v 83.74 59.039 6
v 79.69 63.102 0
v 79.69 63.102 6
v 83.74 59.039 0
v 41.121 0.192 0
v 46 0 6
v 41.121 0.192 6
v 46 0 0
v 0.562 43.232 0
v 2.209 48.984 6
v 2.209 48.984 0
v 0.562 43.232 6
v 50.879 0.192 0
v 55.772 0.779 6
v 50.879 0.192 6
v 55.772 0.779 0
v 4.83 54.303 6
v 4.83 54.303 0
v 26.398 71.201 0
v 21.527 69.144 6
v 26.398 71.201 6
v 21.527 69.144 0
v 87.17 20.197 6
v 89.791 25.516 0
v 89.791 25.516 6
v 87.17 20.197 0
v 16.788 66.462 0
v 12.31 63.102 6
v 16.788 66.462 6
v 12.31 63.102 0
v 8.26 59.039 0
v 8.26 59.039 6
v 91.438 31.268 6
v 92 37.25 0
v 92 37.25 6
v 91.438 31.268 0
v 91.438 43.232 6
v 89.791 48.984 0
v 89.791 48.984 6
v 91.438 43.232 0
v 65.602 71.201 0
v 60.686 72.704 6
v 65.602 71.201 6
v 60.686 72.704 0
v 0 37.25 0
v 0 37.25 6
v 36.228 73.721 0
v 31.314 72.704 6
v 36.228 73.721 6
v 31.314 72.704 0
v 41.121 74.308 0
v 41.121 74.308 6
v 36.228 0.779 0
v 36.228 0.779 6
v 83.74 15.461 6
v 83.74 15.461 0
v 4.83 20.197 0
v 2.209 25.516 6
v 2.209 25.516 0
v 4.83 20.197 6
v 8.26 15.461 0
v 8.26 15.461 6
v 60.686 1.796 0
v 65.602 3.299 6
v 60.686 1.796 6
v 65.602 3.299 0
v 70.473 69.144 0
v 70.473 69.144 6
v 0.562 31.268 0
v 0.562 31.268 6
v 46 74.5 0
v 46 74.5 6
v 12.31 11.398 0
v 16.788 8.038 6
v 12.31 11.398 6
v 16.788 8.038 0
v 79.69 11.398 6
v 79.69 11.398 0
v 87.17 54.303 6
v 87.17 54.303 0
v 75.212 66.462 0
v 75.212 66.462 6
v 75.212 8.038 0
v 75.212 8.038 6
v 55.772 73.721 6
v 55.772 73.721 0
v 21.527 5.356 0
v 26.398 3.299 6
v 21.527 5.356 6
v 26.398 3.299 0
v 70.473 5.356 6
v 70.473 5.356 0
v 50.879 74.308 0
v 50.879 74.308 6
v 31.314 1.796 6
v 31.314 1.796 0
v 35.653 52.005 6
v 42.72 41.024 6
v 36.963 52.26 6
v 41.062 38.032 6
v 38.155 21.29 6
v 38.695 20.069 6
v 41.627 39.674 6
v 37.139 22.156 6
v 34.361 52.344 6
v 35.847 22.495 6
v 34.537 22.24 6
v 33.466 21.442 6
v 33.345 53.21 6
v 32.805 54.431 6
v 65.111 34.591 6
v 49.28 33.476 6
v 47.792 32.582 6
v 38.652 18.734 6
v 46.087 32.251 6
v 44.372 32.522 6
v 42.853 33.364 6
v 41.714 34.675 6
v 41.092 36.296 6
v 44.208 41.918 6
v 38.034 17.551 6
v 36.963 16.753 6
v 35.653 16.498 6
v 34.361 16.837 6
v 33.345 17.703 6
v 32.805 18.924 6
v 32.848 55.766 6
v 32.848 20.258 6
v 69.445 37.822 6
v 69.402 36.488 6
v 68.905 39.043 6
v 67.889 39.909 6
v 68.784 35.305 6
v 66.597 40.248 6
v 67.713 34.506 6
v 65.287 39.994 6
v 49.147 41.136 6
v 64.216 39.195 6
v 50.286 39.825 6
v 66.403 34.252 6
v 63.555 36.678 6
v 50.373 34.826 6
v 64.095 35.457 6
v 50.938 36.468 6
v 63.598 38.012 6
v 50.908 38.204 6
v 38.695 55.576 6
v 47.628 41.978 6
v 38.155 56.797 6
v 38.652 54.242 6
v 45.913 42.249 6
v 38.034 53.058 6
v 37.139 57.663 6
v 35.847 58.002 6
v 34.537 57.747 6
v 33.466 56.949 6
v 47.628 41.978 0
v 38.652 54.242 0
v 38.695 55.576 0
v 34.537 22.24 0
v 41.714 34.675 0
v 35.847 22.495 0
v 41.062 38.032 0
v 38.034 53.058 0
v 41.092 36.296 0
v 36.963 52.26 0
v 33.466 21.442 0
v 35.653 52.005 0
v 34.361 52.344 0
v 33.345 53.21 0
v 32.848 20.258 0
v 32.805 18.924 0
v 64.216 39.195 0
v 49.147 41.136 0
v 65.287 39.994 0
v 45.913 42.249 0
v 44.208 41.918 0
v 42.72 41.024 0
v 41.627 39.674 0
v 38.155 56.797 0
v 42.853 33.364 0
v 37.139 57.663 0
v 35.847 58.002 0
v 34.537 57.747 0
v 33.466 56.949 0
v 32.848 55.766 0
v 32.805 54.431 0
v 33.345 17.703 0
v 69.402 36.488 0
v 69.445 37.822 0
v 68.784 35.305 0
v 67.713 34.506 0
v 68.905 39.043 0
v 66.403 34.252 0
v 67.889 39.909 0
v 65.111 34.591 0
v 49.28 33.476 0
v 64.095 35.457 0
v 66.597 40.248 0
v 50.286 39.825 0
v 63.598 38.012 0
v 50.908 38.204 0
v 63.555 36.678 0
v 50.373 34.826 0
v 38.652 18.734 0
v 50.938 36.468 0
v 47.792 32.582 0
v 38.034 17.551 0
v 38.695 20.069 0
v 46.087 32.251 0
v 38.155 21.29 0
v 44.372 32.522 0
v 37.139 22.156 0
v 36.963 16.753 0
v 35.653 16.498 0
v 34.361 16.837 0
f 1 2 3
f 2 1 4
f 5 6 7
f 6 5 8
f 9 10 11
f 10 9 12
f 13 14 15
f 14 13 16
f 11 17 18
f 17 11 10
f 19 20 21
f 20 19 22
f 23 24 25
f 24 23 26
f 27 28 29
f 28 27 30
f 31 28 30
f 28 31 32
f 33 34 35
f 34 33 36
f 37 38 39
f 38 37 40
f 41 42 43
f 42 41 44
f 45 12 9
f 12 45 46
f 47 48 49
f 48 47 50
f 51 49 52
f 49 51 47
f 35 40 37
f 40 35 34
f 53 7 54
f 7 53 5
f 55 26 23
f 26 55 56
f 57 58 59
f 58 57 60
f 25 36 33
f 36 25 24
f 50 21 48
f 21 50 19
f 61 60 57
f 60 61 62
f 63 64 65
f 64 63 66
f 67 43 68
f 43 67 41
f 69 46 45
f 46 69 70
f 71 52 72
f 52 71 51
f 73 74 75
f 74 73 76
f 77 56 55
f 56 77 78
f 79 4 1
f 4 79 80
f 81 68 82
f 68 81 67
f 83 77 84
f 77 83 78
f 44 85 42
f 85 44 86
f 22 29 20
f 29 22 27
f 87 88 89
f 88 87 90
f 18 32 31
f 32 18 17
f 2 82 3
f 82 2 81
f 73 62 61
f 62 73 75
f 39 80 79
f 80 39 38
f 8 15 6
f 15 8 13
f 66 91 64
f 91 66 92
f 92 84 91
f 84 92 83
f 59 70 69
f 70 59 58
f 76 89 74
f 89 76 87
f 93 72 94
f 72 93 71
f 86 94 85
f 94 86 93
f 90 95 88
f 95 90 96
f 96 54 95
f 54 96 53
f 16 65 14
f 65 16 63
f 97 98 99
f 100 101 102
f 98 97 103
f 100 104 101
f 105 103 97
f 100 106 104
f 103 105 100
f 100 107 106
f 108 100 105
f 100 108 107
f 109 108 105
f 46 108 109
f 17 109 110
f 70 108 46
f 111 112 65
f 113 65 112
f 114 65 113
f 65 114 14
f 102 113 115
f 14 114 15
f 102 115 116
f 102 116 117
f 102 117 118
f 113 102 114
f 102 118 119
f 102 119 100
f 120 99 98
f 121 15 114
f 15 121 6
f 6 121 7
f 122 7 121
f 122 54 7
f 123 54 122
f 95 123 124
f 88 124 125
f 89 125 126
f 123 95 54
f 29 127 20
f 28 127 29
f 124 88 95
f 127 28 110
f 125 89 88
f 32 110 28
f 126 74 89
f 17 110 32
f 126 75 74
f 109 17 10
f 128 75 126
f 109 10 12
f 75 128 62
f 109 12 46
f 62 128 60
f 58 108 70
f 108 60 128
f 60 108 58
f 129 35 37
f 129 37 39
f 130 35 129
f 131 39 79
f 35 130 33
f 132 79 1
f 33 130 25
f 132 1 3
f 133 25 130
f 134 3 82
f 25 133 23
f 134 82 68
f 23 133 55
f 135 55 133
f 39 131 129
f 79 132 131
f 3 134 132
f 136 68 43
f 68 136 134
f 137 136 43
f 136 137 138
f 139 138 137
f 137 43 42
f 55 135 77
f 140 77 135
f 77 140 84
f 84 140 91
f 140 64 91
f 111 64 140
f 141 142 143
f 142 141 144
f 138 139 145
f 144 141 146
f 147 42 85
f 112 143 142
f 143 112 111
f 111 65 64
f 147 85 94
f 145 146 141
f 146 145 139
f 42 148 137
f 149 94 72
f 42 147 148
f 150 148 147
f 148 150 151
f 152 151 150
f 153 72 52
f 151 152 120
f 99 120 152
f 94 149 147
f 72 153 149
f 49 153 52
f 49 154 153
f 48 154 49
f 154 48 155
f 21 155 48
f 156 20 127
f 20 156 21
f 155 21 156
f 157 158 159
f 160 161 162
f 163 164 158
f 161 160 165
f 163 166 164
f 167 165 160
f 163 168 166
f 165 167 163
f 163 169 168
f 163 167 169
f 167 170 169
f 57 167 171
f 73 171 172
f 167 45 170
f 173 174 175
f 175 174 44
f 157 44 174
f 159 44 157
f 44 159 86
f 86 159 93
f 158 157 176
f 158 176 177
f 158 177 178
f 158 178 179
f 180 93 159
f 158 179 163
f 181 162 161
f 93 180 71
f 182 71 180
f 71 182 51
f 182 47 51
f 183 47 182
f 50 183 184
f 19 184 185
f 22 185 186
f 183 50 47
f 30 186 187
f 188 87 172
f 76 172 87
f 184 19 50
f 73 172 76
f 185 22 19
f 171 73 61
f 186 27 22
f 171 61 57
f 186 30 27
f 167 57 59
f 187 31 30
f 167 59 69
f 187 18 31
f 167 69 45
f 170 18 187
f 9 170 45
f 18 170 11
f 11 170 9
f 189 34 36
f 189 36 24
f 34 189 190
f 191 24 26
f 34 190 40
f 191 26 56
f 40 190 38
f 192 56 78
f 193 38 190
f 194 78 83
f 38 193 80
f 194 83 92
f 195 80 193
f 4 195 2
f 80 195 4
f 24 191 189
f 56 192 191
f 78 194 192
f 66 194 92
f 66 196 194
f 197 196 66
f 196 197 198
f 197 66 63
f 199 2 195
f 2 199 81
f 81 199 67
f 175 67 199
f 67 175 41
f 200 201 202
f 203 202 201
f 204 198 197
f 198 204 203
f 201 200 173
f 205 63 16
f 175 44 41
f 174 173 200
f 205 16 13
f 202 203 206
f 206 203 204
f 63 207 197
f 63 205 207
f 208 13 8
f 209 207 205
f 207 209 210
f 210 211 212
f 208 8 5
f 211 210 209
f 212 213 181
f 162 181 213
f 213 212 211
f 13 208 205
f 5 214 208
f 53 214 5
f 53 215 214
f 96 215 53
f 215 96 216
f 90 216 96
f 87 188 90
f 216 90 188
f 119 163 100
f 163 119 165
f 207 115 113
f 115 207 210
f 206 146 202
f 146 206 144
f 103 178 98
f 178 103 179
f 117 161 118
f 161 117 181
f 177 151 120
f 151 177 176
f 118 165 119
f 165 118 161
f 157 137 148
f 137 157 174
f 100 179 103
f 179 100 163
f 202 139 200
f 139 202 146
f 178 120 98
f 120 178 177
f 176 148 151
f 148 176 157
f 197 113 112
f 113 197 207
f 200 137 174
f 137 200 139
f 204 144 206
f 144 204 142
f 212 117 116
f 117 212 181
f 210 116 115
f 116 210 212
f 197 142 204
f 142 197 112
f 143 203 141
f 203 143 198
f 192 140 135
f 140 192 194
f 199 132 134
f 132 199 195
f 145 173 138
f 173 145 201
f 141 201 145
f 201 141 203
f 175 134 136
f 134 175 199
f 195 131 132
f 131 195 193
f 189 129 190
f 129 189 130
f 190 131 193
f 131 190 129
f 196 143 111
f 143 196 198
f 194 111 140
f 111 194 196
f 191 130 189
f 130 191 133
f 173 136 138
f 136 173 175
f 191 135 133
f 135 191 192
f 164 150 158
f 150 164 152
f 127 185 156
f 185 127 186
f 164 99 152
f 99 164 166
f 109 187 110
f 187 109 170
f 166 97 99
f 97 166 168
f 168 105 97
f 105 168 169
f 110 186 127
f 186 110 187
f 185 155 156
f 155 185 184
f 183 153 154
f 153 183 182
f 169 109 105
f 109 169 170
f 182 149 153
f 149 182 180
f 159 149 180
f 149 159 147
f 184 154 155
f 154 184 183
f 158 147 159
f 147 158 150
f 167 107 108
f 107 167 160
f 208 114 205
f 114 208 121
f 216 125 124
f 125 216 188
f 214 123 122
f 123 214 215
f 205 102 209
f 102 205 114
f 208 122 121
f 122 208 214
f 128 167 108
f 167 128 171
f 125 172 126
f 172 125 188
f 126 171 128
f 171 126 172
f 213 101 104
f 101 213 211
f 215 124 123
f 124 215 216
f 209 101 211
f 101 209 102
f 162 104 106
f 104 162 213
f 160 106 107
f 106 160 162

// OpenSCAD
$fn = 32;

// ----------------------------------------------------------------------
// Cam plate: double_lobe cam, base R36
// ----------------------------------------------------------------------

// --- parameters (mm) ---
base_r = 36;              // base circle radius
lobe_h = 10;              // cam lobe rise
bore_r = 5;               // shaft bore radius
plate_t = 6;              // plate thickness, Z (extrusion height)
ring_r = 20.5;            // lightening ring radius
bolt_r = 3;               // lightening hole radius
fit_tol = 0.05;           // declared fit tolerance (prompt contract)
free_tol = 0.3;           // declared free tolerance (prompt contract)

profile = [[92, 37.25], [91.438, 43.232], [89.791, 48.984], [87.17, 54.303], [83.74, 59.039], [79.69, 63.102], [75.212, 66.462], [70.473, 69.144], [65.602, 71.201], [60.686, 72.704], [55.772, 73.721], [50.879, 74.308], [46, 74.5], [41.121, 74.308], [36.228, 73.721], [31.314, 72.704], [26.398, 71.201], [21.527, 69.144], [16.788, 66.462], [12.31, 63.102], [8.26, 59.039], [4.83, 54.303], [2.209, 48.984], [0.562, 43.232], [0, 37.25], [0.562, 31.268], [2.209, 25.516], [4.83, 20.197], [8.26, 15.461], [12.31, 11.398], [16.788, 8.038], [21.527, 5.356], [26.398, 3.299], [31.314, 1.796], [36.228, 0.779], [41.121, 0.192], [46, 0], [50.879, 0.192], [55.772, 0.779], [60.686, 1.796], [65.602, 3.299], [70.473, 5.356], [75.212, 8.038], [79.69, 11.398], [83.74, 15.461], [87.17, 20.197], [89.791, 25.516], [91.438, 31.268]];  // primary outline, 48 points, counter clockwise
void_1 = [[50.908, 38.204], [50.286, 39.825], [49.147, 41.136], [47.628, 41.978], [45.913, 42.249], [44.208, 41.918], [42.72, 41.024], [41.627, 39.674], [41.062, 38.032], [41.092, 36.296], [41.714, 34.675], [42.853, 33.364], [44.372, 32.522], [46.087, 32.251], [47.792, 32.582], [49.28, 33.476], [50.373, 34.826], [50.938, 36.468]];  // shaft bore, 18 points
void_2 = [[69.445, 37.822], [68.905, 39.043], [67.889, 39.909], [66.597, 40.248], [65.287, 39.994], [64.216, 39.195], [63.598, 38.012], [63.555, 36.678], [64.095, 35.457], [65.111, 34.591], [66.403, 34.252], [67.713, 34.506], [68.784, 35.305], [69.402, 36.488]];  // lightening hole 1, 14 points
void_3 = [[38.695, 55.576], [38.155, 56.797], [37.139, 57.663], [35.847, 58.002], [34.537, 57.747], [33.466, 56.949], [32.848, 55.766], [32.805, 54.431], [33.345, 53.21], [34.361, 52.344], [35.653, 52.005], [36.963, 52.26], [38.034, 53.058], [38.652, 54.242]];  // lightening hole 2, 14 points
void_4 = [[38.695, 20.069], [38.155, 21.29], [37.139, 22.156], [35.847, 22.495], [34.537, 22.24], [33.466, 21.442], [32.848, 20.258], [32.805, 18.924], [33.345, 17.703], [34.361, 16.837], [35.653, 16.498], [36.963, 16.753], [38.034, 17.551], [38.652, 18.734]];  // lightening hole 3, 14 points

// --- the one profile operation ---
difference() {
  linear_extrude(height = plate_t) polygon(points = profile);
  translate([0, 0, -1])
    linear_extrude(height = plate_t + 2) polygon(points = void_1);
  translate([0, 0, -1])
    linear_extrude(height = plate_t + 2) polygon(points = void_2);
  translate([0, 0, -1])
    linear_extrude(height = plate_t + 2) polygon(points = void_3);
  translate([0, 0, -1])
    linear_extrude(height = plate_t + 2) polygon(points = void_4);
}
